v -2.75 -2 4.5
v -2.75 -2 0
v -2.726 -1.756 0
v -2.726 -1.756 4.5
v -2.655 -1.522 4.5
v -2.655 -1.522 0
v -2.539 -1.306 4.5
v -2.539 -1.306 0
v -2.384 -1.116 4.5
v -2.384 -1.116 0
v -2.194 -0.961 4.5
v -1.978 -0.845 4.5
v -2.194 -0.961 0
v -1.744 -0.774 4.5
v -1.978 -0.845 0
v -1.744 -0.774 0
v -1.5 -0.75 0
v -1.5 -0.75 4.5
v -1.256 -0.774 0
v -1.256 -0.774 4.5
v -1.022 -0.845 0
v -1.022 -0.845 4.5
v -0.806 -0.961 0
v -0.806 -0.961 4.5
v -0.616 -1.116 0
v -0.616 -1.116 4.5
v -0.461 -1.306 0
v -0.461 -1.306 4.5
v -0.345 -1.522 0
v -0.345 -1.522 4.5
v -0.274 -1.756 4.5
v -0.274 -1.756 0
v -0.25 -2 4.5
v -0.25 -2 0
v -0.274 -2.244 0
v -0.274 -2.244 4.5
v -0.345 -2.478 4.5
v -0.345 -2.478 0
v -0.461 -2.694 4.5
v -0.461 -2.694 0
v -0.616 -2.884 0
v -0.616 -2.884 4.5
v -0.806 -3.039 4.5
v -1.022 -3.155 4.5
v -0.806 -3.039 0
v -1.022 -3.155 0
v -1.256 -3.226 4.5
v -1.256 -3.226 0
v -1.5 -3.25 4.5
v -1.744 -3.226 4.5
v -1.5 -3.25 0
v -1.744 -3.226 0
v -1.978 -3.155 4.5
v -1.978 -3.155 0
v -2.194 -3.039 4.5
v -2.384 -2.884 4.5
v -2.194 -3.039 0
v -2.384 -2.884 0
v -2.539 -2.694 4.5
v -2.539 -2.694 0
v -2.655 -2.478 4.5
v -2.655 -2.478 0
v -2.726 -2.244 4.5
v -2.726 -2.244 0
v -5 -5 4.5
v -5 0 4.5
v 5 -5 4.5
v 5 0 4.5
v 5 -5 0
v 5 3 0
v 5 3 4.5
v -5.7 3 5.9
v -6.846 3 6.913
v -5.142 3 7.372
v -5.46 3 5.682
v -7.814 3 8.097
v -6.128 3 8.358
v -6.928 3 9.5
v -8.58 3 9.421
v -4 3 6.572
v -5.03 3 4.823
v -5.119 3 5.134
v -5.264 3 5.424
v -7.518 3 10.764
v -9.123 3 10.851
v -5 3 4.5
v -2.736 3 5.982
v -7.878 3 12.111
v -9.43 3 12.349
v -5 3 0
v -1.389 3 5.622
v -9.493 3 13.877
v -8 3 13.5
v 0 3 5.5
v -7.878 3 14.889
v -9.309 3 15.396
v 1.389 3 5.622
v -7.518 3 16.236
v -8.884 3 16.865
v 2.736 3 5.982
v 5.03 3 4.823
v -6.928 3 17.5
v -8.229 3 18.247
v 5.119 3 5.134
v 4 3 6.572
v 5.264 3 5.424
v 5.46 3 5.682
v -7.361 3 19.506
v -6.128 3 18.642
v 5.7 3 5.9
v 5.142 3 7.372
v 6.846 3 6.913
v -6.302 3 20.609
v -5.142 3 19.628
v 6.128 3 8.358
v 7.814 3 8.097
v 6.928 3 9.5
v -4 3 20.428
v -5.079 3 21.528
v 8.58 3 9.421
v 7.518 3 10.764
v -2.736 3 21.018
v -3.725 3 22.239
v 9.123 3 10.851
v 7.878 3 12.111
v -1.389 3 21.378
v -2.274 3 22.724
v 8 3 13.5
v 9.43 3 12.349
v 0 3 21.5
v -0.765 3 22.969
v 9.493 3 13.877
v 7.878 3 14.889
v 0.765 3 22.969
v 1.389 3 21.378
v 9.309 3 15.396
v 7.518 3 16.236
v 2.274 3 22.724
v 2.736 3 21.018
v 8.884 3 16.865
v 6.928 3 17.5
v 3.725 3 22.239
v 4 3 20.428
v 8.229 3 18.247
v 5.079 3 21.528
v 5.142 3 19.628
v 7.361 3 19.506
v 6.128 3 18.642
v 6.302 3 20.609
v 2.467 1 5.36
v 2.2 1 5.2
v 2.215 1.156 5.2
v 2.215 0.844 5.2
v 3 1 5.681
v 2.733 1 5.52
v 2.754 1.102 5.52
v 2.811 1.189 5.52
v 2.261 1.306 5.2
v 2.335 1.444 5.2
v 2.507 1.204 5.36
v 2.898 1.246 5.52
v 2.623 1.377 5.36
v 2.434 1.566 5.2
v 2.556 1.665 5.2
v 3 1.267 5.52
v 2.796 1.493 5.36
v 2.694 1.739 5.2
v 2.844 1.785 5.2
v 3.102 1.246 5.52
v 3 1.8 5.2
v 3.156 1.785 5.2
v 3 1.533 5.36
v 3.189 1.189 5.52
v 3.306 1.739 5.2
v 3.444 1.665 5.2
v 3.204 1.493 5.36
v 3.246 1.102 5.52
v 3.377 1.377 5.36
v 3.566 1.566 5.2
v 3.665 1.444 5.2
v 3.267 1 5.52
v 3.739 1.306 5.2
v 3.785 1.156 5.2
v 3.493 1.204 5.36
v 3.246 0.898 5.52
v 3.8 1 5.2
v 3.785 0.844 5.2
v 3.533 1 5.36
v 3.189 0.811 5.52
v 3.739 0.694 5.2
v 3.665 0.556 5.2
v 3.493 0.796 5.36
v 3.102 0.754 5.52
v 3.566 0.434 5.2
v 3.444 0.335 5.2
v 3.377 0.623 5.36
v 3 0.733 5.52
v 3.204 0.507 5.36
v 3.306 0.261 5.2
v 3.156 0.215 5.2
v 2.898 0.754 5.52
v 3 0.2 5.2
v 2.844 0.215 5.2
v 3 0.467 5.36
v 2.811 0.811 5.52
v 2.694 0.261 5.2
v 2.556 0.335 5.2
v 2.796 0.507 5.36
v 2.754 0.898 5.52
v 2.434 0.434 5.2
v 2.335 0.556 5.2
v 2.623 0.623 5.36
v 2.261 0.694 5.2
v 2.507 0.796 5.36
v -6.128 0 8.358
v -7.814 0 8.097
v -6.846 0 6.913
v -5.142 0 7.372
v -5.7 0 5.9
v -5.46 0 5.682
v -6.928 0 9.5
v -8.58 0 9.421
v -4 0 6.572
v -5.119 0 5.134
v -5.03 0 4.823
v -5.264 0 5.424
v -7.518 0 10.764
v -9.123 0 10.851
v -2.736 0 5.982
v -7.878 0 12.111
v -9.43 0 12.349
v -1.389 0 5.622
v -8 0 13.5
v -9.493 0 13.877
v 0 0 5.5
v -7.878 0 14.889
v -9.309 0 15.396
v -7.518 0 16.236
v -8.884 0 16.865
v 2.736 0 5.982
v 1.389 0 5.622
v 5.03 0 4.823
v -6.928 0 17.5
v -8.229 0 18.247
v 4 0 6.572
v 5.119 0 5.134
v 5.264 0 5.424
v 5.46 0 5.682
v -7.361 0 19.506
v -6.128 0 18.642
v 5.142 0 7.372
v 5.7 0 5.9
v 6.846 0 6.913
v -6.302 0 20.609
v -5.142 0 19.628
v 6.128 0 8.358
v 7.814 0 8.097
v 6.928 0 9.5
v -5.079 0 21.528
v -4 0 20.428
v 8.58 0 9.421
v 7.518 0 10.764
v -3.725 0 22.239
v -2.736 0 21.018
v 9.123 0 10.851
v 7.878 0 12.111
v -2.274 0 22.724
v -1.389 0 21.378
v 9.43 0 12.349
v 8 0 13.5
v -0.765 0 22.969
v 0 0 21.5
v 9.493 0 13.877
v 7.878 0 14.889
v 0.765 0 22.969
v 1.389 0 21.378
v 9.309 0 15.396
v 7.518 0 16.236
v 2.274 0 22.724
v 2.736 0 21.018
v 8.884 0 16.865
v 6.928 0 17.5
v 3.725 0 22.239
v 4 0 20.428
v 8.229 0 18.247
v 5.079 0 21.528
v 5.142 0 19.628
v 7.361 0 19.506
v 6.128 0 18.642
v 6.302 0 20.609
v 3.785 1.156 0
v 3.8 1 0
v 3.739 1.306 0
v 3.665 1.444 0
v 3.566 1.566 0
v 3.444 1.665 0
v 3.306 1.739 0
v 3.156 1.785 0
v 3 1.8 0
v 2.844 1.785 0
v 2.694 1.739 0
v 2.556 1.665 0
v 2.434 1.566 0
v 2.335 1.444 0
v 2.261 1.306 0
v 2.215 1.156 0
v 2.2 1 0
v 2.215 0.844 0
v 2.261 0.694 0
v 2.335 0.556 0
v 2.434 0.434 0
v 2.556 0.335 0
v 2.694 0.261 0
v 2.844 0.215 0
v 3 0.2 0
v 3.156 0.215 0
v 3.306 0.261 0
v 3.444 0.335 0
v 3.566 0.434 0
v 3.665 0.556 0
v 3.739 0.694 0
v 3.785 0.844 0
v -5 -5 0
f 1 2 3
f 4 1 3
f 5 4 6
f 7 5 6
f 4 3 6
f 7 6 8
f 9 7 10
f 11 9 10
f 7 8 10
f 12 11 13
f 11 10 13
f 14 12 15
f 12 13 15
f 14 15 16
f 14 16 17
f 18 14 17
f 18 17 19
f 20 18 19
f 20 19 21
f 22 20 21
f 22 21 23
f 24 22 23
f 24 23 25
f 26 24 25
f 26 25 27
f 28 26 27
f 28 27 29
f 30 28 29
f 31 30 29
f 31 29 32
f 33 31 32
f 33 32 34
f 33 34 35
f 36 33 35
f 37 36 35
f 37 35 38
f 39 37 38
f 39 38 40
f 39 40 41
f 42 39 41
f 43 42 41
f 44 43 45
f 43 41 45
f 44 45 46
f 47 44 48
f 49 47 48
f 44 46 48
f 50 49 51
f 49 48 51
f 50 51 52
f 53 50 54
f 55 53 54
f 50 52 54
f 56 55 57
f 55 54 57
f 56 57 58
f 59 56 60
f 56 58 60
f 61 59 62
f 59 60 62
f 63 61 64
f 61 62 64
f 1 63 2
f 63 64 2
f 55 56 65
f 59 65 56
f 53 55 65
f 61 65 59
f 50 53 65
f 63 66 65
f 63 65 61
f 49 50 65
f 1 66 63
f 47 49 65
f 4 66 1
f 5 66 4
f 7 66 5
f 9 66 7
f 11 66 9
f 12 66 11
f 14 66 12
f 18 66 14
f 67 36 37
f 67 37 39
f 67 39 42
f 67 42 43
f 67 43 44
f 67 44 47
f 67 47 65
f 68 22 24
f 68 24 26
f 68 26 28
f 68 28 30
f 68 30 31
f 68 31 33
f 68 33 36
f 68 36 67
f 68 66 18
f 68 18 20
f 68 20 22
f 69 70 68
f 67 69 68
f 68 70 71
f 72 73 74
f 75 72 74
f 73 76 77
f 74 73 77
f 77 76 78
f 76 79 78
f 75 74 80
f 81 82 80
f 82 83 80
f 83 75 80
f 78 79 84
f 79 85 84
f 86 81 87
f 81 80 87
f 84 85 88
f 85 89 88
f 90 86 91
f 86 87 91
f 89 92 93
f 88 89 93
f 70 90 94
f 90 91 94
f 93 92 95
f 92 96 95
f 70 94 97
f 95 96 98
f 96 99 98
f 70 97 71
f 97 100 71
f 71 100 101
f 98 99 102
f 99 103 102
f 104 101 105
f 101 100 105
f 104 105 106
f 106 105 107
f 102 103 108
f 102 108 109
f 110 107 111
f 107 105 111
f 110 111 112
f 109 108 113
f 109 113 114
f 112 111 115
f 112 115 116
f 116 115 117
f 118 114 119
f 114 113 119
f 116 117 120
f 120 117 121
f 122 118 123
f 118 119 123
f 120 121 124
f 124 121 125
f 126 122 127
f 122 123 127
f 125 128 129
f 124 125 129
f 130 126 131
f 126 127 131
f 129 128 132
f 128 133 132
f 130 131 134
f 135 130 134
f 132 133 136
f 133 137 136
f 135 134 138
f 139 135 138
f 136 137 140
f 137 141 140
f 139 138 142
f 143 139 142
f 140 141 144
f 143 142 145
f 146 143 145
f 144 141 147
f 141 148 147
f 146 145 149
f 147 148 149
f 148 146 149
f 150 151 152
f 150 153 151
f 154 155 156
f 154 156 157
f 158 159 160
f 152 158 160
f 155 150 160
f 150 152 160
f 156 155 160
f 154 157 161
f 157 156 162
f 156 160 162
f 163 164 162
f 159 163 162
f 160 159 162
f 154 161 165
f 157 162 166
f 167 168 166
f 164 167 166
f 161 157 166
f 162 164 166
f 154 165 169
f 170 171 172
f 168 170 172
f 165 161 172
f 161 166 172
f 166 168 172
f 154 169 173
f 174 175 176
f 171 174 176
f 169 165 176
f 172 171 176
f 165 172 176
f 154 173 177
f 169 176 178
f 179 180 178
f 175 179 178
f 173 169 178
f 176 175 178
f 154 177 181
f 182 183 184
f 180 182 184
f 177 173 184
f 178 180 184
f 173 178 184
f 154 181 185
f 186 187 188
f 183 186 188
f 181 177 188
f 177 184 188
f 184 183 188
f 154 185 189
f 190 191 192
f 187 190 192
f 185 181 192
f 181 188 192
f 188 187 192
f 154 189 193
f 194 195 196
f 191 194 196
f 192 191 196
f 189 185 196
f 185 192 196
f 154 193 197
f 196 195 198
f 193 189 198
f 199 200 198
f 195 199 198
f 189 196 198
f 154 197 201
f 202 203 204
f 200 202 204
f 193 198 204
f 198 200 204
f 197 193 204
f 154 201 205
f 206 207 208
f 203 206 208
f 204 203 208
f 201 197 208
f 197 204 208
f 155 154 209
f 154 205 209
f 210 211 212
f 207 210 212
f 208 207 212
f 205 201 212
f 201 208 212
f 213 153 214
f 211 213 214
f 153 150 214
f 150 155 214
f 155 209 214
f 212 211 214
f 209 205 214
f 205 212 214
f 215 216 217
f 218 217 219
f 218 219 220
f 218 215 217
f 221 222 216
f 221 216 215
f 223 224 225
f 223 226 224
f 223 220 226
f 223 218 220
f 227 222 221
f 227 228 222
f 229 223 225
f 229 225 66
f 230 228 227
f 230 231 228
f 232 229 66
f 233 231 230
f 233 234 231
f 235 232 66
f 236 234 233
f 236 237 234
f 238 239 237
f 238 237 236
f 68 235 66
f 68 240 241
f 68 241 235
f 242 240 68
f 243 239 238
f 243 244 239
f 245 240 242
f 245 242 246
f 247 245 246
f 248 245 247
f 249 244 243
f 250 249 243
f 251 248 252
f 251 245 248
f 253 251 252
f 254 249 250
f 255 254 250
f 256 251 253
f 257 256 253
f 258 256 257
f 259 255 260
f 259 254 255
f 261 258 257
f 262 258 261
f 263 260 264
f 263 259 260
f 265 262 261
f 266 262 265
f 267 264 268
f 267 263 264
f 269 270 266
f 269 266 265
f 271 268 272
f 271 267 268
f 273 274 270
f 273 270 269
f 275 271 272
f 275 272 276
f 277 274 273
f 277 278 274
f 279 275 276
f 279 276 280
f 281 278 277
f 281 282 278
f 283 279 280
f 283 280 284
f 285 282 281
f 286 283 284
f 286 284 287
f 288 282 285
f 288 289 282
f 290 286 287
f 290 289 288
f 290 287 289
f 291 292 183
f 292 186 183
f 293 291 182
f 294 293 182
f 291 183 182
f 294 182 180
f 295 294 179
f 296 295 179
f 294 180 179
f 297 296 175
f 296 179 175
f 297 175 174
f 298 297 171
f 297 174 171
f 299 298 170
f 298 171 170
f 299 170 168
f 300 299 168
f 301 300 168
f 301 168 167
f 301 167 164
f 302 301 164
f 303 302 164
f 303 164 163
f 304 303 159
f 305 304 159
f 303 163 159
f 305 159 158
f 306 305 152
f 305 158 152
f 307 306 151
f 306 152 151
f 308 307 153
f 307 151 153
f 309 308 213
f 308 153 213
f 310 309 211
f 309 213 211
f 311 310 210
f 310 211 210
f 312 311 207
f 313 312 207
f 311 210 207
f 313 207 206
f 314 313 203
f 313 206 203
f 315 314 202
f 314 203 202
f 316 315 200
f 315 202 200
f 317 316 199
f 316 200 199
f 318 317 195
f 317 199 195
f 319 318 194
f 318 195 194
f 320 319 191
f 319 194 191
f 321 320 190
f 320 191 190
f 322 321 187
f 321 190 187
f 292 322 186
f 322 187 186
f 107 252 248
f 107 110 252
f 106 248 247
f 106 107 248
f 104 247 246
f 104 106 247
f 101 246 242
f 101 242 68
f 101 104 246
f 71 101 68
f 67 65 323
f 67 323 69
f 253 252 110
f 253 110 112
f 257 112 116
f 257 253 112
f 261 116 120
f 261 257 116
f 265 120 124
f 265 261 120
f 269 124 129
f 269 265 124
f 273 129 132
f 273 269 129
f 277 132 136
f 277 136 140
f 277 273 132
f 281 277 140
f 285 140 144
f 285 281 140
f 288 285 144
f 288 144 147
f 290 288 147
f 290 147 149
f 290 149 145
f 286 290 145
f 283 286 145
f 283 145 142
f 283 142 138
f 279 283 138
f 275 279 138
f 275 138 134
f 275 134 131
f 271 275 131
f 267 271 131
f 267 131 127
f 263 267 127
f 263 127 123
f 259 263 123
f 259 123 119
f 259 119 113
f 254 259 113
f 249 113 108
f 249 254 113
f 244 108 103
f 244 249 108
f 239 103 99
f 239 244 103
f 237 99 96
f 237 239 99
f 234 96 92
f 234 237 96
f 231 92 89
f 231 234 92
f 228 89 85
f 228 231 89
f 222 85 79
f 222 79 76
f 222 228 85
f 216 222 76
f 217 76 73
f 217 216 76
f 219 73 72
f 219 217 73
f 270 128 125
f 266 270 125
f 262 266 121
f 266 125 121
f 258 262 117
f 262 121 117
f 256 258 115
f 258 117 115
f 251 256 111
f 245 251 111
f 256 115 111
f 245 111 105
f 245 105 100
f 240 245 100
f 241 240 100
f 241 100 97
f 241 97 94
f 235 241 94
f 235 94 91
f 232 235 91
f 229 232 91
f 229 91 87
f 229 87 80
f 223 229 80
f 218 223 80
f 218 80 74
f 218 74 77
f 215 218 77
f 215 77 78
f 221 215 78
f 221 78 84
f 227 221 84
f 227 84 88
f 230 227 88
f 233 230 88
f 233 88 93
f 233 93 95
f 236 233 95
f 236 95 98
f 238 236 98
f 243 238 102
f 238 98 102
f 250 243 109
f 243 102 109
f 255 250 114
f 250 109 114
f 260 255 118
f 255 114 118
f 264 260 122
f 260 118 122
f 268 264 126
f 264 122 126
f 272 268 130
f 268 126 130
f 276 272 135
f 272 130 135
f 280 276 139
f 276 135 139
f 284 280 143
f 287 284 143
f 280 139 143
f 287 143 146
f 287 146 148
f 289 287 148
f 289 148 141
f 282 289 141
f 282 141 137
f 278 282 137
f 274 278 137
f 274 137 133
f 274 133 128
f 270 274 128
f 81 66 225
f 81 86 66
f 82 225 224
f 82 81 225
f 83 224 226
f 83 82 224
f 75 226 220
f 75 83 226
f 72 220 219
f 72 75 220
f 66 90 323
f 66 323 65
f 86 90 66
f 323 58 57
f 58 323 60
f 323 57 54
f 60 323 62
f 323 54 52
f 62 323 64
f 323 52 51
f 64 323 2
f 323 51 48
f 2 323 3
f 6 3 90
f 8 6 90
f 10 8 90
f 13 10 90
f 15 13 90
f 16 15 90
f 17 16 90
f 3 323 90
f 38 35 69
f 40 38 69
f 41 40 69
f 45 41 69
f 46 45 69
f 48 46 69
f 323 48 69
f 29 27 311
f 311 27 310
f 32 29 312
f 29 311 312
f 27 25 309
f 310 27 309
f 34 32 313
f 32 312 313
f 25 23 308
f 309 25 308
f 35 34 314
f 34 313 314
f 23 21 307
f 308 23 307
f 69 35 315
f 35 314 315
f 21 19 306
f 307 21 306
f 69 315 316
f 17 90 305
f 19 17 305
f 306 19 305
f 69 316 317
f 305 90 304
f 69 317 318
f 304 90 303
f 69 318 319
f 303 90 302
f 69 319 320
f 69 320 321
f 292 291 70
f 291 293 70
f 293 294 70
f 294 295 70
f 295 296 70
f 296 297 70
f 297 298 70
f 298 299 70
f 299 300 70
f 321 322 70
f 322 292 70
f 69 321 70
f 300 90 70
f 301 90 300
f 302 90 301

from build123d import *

# Parameters (mm, degrees)
BOSS_EXTRUDE1_DEPTH       = 3
SKETCH2_W                 = 10
SKETCH2_H                 = 4.5
BOSS_EXTRUDE2_DEPTH       = 5
M2X0_4_TAPPED_HOLE1_D     = 1.6
M2X0_4_TAPPED_HOLE1_DEPTH = 5.2
M2X0_4_TAPPED_HOLE1_TIP   = 0.480688495
M3X0_5_TAPPED_HOLE1_D     = 2.5
M14_CLEARANCE_HOLE1_D     = 16
FILLET1_R                 = 1.749999932


with BuildPart() as part:
    # Sketch1 → Boss-Extrude1 (new body)
    with BuildSketch(Plane.XZ):
        with BuildLine():
            Line((-5, 5.422252789), (-5, 0))
            Line((-5, 0), (5, 0))
            Line((5, 0), (5, 5.422252789))
            ThreePointArc((5, 5.422252789), (0, 23), (-5, 5.422252789))
        make_face()
    extrude(amount=-BOSS_EXTRUDE1_DEPTH)

    # Sketch2 → Boss-Extrude2 (add)
    with BuildSketch(Plane.XZ):
        with Locations((0, 2.25)):
            Rectangle(SKETCH2_W, SKETCH2_H)
    extrude(amount=BOSS_EXTRUDE2_DEPTH)

    # M2x0.4 Tapped Hole1
    with Locations(Plane(origin=(0, 0, 0), x_dir=(-1, 0, 0), z_dir=(0, 0, -1))):
        with Locations((-3, 1)):
            Hole(M2X0_4_TAPPED_HOLE1_D / 2, depth=M2X0_4_TAPPED_HOLE1_DEPTH)
            with Locations((0, 0, -(M2X0_4_TAPPED_HOLE1_DEPTH + M2X0_4_TAPPED_HOLE1_TIP / 2))):  # 118° drill point
                Cone(0, M2X0_4_TAPPED_HOLE1_D / 2, M2X0_4_TAPPED_HOLE1_TIP, mode=Mode.SUBTRACT)

    # M3x0.5 Tapped Hole1 (through all)
    with Locations(Plane.XY.offset(4.5)):
        with Locations((-1.5, -2)):
            Hole(M3X0_5_TAPPED_HOLE1_D / 2)

    # M14 Clearance Hole1 (through all)
    with Locations(Plane(origin=(0, 0, 0), x_dir=(-1, 0, 0), z_dir=(0, -1, 0))):
        with Locations((0, -13.5)):
            Hole(M14_CLEARANCE_HOLE1_D / 2)

    # Fillet1
    fillet1_edges = [part.edges().sort_by_distance(p)[0] for p in [
        (-5, 1.5, 5.422252789),
        (5, 1.5, 5.422252789),
    ]]
    fillet(fillet1_edges, radius=FILLET1_R)


solid = part.part
